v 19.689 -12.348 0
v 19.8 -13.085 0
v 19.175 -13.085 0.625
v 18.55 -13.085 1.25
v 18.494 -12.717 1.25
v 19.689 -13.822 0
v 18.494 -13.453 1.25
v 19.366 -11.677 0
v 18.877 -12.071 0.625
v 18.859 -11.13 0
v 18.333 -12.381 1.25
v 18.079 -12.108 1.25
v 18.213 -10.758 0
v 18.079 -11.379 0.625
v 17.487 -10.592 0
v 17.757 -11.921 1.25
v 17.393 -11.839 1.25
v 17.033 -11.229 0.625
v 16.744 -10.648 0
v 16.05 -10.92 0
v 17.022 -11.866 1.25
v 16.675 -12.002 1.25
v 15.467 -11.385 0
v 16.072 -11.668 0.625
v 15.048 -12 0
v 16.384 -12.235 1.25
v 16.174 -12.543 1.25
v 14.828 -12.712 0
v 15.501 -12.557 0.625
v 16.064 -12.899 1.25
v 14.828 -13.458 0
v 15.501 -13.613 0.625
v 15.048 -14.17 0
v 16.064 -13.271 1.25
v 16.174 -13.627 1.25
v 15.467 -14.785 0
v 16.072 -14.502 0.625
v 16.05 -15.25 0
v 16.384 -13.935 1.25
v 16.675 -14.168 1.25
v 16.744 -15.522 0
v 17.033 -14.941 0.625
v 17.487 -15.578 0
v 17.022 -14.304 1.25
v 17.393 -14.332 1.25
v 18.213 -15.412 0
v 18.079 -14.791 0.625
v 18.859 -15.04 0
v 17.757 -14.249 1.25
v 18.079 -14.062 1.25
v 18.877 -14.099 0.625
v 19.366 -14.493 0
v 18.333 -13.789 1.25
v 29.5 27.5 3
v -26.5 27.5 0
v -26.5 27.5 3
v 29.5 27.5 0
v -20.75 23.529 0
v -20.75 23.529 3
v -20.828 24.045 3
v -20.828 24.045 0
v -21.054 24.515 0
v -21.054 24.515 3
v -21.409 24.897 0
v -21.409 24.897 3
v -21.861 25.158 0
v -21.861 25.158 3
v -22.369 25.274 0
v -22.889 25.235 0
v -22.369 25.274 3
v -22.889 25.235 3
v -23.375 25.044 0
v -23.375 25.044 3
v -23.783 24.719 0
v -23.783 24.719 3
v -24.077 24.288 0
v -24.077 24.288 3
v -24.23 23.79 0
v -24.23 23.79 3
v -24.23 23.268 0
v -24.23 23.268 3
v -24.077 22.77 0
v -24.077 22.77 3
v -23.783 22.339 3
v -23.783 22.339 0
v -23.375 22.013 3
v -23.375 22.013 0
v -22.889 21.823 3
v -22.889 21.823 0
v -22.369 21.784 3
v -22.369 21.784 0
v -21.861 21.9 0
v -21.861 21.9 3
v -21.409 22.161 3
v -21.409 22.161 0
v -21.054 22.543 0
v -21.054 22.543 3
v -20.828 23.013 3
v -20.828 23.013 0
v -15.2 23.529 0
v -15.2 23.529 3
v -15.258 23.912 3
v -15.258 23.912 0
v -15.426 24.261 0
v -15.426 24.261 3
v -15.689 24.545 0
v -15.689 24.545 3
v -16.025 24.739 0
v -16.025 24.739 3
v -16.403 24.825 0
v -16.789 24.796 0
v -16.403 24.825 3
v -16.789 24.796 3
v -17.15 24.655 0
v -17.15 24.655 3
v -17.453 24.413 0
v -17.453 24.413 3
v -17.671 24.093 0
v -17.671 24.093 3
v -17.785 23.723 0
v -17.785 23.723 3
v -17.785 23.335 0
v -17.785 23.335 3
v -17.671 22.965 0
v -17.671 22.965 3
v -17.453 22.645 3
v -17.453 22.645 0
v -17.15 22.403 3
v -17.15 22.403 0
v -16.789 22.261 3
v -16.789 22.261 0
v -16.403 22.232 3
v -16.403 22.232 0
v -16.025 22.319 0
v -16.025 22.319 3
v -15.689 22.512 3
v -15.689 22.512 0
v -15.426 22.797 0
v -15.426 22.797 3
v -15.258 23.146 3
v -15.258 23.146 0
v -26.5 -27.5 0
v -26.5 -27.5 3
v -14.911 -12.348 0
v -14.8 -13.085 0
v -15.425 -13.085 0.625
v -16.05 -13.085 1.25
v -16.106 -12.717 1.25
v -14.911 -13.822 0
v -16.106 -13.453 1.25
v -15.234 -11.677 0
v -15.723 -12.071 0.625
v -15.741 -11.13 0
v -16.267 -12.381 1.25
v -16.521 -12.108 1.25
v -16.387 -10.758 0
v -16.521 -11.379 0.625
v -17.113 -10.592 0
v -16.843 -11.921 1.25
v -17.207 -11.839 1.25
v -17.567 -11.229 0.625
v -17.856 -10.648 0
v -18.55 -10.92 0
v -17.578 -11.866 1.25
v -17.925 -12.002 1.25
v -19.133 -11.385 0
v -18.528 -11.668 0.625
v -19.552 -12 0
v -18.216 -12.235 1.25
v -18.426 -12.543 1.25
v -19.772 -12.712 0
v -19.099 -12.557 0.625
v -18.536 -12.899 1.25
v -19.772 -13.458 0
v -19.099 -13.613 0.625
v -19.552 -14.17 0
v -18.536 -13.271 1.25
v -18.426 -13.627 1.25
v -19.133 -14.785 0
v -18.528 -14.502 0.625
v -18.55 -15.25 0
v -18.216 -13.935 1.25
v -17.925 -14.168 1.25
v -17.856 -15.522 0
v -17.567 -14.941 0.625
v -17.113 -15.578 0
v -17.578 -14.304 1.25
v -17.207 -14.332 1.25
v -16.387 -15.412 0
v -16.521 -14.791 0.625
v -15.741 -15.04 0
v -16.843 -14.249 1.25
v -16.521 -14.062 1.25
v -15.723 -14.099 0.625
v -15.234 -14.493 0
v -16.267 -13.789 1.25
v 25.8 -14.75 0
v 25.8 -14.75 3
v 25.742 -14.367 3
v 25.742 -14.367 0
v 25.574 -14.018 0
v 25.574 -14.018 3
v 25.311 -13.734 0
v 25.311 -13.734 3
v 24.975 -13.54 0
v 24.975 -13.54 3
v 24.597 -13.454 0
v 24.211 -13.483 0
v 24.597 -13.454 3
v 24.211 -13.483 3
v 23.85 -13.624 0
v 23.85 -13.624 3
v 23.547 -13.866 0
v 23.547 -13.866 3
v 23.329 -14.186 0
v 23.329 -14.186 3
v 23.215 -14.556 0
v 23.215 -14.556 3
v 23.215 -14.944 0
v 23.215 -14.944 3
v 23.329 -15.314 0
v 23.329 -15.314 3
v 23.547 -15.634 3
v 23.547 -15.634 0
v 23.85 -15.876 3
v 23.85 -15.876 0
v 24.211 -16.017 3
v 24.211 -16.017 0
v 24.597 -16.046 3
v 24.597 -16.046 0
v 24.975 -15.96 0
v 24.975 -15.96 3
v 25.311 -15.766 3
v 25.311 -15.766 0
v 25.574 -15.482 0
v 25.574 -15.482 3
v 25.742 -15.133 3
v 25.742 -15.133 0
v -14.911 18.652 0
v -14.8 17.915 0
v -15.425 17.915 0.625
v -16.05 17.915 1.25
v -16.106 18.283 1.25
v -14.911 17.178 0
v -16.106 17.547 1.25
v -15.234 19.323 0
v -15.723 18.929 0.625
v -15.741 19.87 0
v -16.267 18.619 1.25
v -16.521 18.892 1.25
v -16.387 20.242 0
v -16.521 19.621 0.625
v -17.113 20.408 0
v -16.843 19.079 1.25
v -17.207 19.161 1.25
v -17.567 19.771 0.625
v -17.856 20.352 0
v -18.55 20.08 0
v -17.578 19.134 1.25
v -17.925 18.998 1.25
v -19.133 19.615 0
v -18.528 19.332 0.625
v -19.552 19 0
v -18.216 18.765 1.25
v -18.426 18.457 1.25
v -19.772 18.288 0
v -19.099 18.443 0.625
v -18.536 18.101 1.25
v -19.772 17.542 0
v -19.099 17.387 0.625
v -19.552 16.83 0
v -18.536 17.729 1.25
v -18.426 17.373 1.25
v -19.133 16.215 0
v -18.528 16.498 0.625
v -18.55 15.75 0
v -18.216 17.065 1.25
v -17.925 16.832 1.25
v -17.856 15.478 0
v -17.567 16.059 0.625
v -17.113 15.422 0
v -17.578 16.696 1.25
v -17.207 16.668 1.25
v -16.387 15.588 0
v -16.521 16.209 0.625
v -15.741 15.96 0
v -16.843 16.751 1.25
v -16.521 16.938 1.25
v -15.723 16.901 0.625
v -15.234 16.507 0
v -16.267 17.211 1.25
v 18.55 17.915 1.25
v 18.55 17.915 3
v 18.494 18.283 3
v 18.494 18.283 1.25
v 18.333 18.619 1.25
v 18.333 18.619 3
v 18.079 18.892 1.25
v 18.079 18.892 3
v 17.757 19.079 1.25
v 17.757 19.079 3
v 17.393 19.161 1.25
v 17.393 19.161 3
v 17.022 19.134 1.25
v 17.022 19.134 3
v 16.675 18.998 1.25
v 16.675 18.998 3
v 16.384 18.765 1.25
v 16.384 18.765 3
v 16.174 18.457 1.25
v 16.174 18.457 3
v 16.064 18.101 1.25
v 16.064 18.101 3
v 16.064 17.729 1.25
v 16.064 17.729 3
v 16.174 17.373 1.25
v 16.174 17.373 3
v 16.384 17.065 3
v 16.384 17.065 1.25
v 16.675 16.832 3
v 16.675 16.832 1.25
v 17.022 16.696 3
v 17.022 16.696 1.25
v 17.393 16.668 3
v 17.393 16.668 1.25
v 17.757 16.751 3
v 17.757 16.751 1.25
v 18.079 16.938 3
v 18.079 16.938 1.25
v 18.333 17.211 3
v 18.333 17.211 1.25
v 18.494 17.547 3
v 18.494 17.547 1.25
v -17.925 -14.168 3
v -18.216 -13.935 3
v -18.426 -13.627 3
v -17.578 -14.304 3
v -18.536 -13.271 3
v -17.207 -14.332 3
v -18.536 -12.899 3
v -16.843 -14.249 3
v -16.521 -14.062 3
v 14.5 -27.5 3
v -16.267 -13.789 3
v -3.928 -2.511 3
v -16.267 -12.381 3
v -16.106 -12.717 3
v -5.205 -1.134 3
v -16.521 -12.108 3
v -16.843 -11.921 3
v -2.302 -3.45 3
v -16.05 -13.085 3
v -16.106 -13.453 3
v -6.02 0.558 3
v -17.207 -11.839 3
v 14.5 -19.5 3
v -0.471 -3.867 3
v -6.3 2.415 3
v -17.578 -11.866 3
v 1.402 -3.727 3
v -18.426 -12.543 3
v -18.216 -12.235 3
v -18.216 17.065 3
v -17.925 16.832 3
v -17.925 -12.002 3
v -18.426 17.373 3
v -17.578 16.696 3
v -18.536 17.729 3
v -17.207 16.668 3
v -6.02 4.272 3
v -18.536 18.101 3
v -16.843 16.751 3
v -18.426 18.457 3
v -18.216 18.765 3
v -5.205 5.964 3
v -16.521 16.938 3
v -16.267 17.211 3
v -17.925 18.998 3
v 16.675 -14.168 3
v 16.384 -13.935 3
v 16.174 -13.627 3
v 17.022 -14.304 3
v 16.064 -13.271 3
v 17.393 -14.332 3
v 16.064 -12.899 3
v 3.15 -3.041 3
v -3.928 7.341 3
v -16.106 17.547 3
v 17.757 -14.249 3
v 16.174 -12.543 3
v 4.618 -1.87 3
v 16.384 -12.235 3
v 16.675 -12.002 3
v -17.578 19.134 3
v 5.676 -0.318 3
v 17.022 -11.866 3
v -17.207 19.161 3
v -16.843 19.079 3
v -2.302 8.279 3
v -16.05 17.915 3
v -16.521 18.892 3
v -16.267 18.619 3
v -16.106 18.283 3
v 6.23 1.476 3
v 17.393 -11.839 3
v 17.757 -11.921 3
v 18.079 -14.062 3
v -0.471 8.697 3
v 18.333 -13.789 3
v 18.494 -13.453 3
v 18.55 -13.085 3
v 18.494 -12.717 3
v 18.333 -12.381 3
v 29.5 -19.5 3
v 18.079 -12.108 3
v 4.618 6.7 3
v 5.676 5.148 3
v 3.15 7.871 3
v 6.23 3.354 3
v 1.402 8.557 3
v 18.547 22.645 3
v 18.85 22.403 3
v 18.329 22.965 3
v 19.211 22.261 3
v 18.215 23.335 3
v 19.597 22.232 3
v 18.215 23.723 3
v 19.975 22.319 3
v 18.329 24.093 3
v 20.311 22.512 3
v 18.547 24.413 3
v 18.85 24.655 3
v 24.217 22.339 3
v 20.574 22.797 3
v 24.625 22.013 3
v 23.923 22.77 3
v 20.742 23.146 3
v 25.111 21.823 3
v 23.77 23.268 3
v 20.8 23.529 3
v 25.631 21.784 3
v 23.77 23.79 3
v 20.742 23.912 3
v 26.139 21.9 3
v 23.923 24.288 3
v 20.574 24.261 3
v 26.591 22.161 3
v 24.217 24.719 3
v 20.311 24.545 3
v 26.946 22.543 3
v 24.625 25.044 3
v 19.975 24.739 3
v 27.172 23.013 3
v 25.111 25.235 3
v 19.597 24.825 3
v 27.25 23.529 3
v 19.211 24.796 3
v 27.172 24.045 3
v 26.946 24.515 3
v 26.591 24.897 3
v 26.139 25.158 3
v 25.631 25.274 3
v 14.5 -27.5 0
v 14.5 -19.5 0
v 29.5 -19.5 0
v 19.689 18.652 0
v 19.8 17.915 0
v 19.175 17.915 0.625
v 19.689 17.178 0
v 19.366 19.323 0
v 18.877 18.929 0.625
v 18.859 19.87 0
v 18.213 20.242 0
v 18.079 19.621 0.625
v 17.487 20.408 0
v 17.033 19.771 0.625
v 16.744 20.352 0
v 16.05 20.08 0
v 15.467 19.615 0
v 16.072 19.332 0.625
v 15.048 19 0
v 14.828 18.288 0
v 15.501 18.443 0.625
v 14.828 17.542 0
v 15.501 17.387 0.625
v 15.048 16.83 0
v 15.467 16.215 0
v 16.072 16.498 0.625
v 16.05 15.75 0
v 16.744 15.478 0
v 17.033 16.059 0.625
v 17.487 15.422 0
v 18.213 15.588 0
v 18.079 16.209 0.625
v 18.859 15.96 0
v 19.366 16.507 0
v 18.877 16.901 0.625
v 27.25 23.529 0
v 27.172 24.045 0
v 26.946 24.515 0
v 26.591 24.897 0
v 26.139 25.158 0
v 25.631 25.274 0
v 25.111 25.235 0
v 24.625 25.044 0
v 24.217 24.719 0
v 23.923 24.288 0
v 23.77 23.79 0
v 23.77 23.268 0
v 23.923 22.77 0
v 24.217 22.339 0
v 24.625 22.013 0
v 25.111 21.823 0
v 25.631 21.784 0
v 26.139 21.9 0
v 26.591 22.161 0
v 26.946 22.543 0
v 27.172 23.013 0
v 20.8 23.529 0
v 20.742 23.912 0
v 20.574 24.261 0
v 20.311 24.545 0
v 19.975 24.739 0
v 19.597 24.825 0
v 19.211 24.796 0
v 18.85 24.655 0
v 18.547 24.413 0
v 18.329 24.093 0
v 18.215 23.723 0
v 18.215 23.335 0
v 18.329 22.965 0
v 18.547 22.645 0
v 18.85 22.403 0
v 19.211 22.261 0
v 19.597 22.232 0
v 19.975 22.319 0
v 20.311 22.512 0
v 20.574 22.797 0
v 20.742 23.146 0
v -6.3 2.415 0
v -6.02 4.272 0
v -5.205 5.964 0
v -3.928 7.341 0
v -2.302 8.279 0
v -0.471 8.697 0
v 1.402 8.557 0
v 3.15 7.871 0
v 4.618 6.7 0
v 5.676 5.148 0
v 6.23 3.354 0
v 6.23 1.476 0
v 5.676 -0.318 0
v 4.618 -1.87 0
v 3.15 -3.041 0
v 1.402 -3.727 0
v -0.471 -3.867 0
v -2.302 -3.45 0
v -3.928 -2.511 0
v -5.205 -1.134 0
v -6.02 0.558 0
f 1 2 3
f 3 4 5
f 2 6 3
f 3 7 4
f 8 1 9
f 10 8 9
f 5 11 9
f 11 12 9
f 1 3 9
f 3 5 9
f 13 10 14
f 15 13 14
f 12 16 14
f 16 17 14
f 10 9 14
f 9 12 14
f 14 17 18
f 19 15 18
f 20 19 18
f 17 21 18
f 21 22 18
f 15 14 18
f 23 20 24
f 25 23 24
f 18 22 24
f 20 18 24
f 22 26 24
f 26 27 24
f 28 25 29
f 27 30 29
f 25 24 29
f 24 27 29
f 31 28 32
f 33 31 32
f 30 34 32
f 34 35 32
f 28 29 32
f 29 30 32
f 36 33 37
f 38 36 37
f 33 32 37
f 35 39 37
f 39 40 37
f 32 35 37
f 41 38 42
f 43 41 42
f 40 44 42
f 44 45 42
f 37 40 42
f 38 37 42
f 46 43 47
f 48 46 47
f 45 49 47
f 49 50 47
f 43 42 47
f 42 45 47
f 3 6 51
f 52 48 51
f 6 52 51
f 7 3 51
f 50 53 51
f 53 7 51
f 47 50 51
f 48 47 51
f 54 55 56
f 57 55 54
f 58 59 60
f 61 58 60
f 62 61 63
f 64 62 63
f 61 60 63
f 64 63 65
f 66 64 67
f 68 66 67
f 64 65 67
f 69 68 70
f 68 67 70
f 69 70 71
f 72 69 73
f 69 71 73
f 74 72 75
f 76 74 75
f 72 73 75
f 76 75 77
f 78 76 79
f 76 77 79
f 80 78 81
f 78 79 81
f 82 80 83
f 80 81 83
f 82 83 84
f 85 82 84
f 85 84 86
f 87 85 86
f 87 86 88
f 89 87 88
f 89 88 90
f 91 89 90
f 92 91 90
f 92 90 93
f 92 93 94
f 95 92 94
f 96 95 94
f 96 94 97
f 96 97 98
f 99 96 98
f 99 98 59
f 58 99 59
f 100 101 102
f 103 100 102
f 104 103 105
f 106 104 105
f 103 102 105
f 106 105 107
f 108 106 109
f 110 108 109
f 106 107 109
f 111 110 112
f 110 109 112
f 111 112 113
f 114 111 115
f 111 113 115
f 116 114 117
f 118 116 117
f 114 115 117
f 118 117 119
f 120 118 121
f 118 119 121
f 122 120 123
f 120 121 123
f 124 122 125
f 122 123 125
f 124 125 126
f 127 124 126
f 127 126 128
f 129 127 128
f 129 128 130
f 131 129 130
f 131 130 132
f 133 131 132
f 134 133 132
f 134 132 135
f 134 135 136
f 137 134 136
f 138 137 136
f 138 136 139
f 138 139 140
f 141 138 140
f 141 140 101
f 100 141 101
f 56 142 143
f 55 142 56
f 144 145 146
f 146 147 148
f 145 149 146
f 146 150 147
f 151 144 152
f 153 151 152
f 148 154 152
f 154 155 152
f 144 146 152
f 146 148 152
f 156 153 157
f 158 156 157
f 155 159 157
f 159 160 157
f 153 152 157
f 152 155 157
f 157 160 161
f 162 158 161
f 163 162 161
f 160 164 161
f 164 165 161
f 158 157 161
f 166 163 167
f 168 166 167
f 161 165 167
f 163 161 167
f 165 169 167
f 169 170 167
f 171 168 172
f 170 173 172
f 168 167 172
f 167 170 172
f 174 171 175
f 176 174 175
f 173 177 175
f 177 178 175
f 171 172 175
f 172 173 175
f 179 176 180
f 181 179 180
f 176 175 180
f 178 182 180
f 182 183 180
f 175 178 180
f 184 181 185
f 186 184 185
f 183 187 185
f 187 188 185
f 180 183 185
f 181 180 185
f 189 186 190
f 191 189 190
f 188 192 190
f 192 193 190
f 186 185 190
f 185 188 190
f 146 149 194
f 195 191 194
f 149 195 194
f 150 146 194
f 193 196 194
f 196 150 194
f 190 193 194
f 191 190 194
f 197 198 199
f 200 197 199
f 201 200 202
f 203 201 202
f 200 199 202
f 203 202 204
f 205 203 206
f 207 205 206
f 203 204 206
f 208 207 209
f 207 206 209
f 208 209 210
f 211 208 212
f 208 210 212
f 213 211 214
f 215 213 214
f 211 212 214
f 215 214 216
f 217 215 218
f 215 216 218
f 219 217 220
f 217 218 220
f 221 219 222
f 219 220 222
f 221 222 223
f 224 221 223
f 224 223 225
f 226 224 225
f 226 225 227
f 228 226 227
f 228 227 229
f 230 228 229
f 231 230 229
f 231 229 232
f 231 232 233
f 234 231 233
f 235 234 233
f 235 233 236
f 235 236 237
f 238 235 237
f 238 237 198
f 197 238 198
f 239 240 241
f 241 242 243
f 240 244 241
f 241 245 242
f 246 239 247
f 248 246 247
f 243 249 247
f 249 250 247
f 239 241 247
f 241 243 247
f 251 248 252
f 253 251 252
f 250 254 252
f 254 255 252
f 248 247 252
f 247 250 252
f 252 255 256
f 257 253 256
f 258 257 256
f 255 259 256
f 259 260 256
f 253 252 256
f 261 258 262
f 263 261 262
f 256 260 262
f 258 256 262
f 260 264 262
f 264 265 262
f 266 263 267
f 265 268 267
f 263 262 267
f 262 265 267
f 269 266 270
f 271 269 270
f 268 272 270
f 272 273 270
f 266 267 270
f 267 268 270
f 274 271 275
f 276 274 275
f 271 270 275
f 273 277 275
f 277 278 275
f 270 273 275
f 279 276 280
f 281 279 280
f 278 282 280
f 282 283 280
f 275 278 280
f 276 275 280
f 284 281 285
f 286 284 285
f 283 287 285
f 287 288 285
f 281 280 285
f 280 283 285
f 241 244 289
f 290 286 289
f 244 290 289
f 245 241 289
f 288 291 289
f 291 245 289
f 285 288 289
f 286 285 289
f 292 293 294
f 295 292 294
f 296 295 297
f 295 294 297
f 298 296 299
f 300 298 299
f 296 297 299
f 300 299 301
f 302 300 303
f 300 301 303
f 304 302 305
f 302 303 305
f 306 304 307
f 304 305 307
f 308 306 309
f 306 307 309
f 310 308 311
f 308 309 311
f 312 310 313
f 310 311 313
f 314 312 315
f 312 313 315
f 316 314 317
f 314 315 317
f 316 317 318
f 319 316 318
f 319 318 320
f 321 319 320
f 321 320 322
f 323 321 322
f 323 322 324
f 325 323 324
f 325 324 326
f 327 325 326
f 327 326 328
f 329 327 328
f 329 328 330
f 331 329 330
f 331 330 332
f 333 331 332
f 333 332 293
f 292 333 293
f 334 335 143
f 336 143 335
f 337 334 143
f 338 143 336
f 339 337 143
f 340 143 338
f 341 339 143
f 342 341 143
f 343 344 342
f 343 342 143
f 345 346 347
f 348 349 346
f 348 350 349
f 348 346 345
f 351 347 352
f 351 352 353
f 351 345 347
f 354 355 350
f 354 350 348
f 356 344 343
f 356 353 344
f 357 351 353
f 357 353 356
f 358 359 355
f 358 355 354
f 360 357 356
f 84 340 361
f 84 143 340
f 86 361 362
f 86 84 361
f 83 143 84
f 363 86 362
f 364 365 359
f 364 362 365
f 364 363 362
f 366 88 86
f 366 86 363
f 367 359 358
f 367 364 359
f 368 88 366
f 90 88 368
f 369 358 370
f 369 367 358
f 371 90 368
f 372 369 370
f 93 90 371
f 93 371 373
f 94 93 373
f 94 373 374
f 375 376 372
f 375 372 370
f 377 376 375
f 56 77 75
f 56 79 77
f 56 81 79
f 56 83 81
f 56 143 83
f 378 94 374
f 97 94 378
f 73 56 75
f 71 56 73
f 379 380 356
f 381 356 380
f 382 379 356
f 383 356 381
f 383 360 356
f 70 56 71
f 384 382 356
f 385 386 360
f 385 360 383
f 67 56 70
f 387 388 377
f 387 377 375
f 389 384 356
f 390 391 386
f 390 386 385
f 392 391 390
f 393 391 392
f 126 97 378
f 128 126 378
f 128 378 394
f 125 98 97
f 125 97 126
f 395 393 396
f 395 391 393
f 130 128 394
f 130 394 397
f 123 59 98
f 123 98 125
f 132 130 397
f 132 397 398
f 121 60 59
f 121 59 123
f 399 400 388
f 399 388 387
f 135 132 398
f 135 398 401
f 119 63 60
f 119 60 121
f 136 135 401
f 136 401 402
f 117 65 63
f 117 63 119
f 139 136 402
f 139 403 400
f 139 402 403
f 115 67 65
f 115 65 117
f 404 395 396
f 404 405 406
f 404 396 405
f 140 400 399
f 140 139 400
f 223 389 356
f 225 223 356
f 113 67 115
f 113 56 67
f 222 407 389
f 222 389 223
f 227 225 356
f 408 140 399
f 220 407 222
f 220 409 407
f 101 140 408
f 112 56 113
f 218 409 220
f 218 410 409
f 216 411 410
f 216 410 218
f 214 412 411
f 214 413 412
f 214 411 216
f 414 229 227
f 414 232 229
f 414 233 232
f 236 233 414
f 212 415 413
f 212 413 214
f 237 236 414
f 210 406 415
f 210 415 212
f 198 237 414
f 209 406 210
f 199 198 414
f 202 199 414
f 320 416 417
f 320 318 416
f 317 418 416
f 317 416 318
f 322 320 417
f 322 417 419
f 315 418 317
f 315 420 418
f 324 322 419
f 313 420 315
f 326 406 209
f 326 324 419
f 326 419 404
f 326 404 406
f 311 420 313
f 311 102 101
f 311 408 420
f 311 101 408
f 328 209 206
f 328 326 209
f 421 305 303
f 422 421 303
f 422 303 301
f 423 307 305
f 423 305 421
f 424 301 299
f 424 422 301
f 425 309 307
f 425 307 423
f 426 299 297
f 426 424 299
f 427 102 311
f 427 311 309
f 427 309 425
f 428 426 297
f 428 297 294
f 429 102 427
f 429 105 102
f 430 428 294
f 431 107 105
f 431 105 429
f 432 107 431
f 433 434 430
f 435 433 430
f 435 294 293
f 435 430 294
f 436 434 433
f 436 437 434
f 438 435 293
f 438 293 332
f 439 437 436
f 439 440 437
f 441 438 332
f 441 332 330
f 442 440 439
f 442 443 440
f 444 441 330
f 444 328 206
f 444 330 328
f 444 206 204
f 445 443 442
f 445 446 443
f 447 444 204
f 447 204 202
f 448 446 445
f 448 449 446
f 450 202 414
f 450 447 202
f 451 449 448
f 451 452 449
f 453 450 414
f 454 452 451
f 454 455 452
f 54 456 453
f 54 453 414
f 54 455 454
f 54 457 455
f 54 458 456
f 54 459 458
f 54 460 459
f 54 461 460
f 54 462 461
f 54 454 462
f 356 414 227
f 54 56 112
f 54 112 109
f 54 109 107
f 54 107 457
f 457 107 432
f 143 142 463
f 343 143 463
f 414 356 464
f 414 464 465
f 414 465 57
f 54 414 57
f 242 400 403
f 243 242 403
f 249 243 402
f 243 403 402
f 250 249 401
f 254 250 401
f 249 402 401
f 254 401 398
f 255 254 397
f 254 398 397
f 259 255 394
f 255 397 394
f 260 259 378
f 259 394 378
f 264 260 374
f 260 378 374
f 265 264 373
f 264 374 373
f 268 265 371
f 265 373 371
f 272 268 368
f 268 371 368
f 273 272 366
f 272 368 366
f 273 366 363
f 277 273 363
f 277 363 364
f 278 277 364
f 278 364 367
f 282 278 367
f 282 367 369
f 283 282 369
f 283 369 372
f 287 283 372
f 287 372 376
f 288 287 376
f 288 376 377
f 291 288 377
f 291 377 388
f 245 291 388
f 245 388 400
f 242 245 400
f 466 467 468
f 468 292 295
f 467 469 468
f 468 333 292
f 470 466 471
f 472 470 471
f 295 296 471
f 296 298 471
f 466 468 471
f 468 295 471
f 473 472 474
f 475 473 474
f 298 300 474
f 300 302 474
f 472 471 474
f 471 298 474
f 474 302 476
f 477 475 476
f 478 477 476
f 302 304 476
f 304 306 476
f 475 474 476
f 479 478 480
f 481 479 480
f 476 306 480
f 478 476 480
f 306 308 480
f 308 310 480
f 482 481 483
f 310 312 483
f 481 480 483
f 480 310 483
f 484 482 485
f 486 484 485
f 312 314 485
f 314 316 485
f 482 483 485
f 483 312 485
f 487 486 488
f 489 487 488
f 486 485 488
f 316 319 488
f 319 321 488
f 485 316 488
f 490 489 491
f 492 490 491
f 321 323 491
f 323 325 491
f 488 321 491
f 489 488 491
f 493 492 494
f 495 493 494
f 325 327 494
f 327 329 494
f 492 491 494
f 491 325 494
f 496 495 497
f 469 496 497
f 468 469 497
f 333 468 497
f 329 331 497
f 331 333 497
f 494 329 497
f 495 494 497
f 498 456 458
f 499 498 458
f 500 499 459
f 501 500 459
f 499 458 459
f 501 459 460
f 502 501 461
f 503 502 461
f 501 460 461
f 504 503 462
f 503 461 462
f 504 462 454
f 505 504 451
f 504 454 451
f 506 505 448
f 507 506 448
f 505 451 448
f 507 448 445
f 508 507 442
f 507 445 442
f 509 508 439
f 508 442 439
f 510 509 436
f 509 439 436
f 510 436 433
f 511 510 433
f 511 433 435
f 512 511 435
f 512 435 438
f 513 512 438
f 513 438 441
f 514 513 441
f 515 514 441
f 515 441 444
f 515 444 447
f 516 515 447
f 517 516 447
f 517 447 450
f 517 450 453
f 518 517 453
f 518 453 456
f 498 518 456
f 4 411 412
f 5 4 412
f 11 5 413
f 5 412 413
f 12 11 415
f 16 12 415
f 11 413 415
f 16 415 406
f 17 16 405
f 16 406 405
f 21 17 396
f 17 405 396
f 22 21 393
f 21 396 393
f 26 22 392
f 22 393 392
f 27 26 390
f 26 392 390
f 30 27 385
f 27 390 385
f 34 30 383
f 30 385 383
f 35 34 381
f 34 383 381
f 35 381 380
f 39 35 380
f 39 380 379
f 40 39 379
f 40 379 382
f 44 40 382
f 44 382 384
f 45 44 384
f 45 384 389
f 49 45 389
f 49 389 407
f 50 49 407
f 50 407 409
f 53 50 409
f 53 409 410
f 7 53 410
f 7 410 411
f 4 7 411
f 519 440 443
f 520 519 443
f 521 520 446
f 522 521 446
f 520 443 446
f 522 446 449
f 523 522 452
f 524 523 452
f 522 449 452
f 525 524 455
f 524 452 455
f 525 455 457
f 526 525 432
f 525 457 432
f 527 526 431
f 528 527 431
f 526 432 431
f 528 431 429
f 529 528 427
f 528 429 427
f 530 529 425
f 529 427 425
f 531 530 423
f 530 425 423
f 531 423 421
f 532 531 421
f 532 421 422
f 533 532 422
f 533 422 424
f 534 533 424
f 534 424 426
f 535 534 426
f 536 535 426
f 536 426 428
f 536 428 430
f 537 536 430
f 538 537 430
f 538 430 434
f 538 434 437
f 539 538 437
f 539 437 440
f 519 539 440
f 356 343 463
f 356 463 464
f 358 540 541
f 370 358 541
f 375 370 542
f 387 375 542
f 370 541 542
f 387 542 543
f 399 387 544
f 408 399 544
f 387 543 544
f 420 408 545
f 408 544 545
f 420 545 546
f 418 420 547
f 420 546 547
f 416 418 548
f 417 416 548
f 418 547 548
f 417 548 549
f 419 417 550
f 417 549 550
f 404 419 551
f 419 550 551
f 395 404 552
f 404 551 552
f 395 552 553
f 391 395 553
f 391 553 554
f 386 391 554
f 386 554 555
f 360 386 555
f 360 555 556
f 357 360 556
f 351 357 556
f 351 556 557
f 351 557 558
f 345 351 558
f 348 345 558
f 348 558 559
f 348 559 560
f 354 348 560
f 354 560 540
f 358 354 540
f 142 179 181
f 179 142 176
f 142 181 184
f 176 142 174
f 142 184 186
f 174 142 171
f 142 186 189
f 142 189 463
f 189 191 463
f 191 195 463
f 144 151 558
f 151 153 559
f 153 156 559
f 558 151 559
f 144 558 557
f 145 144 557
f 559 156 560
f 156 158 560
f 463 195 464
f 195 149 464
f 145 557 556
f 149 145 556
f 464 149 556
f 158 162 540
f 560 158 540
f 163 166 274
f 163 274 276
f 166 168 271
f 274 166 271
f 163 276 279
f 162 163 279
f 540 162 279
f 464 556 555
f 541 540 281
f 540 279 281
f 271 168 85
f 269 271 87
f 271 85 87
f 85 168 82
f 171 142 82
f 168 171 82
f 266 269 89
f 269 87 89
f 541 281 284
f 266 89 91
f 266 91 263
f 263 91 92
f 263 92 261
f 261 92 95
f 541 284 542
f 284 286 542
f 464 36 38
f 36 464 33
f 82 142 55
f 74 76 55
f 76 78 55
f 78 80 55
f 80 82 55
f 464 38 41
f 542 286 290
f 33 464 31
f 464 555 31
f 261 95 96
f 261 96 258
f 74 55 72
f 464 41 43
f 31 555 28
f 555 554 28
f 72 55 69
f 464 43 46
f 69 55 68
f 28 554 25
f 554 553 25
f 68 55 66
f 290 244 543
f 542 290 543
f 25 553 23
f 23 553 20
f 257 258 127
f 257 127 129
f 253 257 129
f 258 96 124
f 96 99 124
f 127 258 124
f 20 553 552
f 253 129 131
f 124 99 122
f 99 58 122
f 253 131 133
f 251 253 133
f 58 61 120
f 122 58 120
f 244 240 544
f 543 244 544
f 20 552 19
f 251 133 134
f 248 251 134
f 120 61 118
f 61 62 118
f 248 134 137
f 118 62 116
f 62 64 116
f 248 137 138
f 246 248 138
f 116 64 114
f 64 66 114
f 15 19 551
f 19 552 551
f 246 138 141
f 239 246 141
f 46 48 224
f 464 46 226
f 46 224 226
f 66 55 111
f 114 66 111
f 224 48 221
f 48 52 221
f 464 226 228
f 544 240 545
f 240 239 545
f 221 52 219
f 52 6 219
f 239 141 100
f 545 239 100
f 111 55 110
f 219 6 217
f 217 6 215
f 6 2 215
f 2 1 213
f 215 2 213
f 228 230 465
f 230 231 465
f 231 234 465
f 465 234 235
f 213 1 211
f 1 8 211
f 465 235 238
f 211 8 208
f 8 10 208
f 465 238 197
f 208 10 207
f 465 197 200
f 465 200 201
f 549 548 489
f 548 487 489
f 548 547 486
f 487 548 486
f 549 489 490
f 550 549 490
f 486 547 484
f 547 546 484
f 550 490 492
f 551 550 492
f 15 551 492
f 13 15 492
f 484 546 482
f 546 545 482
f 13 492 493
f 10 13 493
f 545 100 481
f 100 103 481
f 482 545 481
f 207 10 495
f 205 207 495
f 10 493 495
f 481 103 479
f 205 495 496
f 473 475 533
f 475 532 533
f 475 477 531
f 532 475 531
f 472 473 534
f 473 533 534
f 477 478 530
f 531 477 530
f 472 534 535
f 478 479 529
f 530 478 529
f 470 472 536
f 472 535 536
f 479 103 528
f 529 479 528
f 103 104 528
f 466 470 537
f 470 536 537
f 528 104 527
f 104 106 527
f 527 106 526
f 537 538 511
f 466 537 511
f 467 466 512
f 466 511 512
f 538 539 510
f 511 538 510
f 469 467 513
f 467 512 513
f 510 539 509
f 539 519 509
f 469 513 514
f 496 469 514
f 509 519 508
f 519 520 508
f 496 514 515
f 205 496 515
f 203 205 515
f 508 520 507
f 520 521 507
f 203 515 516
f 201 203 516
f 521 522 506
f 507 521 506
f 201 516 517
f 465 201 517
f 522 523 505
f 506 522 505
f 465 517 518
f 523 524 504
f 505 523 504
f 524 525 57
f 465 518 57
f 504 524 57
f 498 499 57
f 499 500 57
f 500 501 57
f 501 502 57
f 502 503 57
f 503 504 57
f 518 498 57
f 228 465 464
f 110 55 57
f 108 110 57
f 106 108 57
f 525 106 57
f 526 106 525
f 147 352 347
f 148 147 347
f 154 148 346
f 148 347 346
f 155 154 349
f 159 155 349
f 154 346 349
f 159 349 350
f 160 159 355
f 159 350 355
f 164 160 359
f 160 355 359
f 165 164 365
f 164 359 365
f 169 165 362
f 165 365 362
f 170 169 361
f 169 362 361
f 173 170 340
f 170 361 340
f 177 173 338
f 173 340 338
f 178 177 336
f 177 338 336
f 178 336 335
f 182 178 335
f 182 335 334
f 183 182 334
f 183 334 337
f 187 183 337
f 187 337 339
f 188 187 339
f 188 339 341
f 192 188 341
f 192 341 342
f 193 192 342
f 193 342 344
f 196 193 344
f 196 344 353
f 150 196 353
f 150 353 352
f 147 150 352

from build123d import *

# Parameters (mm, degrees)
CROQUIS1_W              = 56
CROQUIS1_H              = 55
SALIENTE_EXTRUIR1_DEPTH = 3
CROQUIS2_R              = 1.3
CROQUIS2_W              = 15
CROQUIS2_H              = 8
CROQUIS2_R_2            = 1.75
CORTAR_EXTRUIR1_DEPTH   = 4
CORTAR_EXTRUIR2_REACH   = 42.441
CROQUIS3_R              = 6.3
CROQUIS4_R              = 1.25
CORTAR_EXTRUIR3_DEPTH   = 10
CHAFL_N2_SIZE           = 1.25


with BuildPart() as part:
    # Croquis1 → Saliente-Extruir1 (new body)
    with BuildSketch(Plane.XY):
        with Locations((1.5, 0)):
            Rectangle(CROQUIS1_W, CROQUIS1_H)
    extrude(amount=SALIENTE_EXTRUIR1_DEPTH)

    # Croquis2 → Cortar-Extruir1 (cut)
    with BuildSketch(Plane.XY.offset(3)):
        with Locations((24.5, -14.75)):
            Circle(CROQUIS2_R)
        with Locations((22, -23.5)):
            Rectangle(CROQUIS2_W, CROQUIS2_H)
        with Locations((25.5, 23.528824725)):
            Circle(CROQUIS2_R_2)
        with Locations((19.5, 23.528824725)):
            Circle(CROQUIS2_R)
        with Locations((-22.5, 23.528824725)):
            Circle(CROQUIS2_R_2)
        with Locations((-16.5, 23.528824725)):
            Circle(CROQUIS2_R)
    extrude(amount=-CORTAR_EXTRUIR1_DEPTH, mode=Mode.SUBTRACT)

    # Croquis3 → Cortar-Extruir2 (cut, up to next)
    with BuildSketch(Plane(origin=(0, 0, 0), x_dir=(-1, 0, 0), z_dir=(0, 0, -1)), mode=Mode.PRIVATE) as cortar_extruir2_sk1:
        with Locations((0, 2.414991539)):
            Circle(CROQUIS3_R)
    cortar_extruir2_tool1 = extrude(cortar_extruir2_sk1.sketch, amount=-CORTAR_EXTRUIR2_REACH, mode=Mode.PRIVATE) & part.part
    add(cortar_extruir2_tool1.solids().sort_by_distance((0, 2.414992, 0))[0], mode=Mode.SUBTRACT)

    # Croquis4 → Cortar-Extruir3 (cut)
    with BuildSketch(Plane.XY.offset(3)):
        with Locations((-17.3, 17.914991539)):
            Circle(CROQUIS4_R)
        with Locations((17.3, 17.914991539)):
            Circle(CROQUIS4_R)
        with Locations((-17.3, -13.085008461)):
            Circle(CROQUIS4_R)
        with Locations((17.3, -13.085008461)):
            Circle(CROQUIS4_R)
    extrude(amount=-CORTAR_EXTRUIR3_DEPTH, mode=Mode.SUBTRACT)

    # Chaflán2
    chafl_n2_edges = [part.edges().sort_by_distance(p)[0] for p in [
        (16.05, 17.914991539, 0),
        (-18.55, -13.085008461, 0),
        (16.05, -13.085008461, 0),
        (-18.55, 17.914991539, 0),
    ]]
    chamfer(chafl_n2_edges, length=CHAFL_N2_SIZE)


solid = part.part
